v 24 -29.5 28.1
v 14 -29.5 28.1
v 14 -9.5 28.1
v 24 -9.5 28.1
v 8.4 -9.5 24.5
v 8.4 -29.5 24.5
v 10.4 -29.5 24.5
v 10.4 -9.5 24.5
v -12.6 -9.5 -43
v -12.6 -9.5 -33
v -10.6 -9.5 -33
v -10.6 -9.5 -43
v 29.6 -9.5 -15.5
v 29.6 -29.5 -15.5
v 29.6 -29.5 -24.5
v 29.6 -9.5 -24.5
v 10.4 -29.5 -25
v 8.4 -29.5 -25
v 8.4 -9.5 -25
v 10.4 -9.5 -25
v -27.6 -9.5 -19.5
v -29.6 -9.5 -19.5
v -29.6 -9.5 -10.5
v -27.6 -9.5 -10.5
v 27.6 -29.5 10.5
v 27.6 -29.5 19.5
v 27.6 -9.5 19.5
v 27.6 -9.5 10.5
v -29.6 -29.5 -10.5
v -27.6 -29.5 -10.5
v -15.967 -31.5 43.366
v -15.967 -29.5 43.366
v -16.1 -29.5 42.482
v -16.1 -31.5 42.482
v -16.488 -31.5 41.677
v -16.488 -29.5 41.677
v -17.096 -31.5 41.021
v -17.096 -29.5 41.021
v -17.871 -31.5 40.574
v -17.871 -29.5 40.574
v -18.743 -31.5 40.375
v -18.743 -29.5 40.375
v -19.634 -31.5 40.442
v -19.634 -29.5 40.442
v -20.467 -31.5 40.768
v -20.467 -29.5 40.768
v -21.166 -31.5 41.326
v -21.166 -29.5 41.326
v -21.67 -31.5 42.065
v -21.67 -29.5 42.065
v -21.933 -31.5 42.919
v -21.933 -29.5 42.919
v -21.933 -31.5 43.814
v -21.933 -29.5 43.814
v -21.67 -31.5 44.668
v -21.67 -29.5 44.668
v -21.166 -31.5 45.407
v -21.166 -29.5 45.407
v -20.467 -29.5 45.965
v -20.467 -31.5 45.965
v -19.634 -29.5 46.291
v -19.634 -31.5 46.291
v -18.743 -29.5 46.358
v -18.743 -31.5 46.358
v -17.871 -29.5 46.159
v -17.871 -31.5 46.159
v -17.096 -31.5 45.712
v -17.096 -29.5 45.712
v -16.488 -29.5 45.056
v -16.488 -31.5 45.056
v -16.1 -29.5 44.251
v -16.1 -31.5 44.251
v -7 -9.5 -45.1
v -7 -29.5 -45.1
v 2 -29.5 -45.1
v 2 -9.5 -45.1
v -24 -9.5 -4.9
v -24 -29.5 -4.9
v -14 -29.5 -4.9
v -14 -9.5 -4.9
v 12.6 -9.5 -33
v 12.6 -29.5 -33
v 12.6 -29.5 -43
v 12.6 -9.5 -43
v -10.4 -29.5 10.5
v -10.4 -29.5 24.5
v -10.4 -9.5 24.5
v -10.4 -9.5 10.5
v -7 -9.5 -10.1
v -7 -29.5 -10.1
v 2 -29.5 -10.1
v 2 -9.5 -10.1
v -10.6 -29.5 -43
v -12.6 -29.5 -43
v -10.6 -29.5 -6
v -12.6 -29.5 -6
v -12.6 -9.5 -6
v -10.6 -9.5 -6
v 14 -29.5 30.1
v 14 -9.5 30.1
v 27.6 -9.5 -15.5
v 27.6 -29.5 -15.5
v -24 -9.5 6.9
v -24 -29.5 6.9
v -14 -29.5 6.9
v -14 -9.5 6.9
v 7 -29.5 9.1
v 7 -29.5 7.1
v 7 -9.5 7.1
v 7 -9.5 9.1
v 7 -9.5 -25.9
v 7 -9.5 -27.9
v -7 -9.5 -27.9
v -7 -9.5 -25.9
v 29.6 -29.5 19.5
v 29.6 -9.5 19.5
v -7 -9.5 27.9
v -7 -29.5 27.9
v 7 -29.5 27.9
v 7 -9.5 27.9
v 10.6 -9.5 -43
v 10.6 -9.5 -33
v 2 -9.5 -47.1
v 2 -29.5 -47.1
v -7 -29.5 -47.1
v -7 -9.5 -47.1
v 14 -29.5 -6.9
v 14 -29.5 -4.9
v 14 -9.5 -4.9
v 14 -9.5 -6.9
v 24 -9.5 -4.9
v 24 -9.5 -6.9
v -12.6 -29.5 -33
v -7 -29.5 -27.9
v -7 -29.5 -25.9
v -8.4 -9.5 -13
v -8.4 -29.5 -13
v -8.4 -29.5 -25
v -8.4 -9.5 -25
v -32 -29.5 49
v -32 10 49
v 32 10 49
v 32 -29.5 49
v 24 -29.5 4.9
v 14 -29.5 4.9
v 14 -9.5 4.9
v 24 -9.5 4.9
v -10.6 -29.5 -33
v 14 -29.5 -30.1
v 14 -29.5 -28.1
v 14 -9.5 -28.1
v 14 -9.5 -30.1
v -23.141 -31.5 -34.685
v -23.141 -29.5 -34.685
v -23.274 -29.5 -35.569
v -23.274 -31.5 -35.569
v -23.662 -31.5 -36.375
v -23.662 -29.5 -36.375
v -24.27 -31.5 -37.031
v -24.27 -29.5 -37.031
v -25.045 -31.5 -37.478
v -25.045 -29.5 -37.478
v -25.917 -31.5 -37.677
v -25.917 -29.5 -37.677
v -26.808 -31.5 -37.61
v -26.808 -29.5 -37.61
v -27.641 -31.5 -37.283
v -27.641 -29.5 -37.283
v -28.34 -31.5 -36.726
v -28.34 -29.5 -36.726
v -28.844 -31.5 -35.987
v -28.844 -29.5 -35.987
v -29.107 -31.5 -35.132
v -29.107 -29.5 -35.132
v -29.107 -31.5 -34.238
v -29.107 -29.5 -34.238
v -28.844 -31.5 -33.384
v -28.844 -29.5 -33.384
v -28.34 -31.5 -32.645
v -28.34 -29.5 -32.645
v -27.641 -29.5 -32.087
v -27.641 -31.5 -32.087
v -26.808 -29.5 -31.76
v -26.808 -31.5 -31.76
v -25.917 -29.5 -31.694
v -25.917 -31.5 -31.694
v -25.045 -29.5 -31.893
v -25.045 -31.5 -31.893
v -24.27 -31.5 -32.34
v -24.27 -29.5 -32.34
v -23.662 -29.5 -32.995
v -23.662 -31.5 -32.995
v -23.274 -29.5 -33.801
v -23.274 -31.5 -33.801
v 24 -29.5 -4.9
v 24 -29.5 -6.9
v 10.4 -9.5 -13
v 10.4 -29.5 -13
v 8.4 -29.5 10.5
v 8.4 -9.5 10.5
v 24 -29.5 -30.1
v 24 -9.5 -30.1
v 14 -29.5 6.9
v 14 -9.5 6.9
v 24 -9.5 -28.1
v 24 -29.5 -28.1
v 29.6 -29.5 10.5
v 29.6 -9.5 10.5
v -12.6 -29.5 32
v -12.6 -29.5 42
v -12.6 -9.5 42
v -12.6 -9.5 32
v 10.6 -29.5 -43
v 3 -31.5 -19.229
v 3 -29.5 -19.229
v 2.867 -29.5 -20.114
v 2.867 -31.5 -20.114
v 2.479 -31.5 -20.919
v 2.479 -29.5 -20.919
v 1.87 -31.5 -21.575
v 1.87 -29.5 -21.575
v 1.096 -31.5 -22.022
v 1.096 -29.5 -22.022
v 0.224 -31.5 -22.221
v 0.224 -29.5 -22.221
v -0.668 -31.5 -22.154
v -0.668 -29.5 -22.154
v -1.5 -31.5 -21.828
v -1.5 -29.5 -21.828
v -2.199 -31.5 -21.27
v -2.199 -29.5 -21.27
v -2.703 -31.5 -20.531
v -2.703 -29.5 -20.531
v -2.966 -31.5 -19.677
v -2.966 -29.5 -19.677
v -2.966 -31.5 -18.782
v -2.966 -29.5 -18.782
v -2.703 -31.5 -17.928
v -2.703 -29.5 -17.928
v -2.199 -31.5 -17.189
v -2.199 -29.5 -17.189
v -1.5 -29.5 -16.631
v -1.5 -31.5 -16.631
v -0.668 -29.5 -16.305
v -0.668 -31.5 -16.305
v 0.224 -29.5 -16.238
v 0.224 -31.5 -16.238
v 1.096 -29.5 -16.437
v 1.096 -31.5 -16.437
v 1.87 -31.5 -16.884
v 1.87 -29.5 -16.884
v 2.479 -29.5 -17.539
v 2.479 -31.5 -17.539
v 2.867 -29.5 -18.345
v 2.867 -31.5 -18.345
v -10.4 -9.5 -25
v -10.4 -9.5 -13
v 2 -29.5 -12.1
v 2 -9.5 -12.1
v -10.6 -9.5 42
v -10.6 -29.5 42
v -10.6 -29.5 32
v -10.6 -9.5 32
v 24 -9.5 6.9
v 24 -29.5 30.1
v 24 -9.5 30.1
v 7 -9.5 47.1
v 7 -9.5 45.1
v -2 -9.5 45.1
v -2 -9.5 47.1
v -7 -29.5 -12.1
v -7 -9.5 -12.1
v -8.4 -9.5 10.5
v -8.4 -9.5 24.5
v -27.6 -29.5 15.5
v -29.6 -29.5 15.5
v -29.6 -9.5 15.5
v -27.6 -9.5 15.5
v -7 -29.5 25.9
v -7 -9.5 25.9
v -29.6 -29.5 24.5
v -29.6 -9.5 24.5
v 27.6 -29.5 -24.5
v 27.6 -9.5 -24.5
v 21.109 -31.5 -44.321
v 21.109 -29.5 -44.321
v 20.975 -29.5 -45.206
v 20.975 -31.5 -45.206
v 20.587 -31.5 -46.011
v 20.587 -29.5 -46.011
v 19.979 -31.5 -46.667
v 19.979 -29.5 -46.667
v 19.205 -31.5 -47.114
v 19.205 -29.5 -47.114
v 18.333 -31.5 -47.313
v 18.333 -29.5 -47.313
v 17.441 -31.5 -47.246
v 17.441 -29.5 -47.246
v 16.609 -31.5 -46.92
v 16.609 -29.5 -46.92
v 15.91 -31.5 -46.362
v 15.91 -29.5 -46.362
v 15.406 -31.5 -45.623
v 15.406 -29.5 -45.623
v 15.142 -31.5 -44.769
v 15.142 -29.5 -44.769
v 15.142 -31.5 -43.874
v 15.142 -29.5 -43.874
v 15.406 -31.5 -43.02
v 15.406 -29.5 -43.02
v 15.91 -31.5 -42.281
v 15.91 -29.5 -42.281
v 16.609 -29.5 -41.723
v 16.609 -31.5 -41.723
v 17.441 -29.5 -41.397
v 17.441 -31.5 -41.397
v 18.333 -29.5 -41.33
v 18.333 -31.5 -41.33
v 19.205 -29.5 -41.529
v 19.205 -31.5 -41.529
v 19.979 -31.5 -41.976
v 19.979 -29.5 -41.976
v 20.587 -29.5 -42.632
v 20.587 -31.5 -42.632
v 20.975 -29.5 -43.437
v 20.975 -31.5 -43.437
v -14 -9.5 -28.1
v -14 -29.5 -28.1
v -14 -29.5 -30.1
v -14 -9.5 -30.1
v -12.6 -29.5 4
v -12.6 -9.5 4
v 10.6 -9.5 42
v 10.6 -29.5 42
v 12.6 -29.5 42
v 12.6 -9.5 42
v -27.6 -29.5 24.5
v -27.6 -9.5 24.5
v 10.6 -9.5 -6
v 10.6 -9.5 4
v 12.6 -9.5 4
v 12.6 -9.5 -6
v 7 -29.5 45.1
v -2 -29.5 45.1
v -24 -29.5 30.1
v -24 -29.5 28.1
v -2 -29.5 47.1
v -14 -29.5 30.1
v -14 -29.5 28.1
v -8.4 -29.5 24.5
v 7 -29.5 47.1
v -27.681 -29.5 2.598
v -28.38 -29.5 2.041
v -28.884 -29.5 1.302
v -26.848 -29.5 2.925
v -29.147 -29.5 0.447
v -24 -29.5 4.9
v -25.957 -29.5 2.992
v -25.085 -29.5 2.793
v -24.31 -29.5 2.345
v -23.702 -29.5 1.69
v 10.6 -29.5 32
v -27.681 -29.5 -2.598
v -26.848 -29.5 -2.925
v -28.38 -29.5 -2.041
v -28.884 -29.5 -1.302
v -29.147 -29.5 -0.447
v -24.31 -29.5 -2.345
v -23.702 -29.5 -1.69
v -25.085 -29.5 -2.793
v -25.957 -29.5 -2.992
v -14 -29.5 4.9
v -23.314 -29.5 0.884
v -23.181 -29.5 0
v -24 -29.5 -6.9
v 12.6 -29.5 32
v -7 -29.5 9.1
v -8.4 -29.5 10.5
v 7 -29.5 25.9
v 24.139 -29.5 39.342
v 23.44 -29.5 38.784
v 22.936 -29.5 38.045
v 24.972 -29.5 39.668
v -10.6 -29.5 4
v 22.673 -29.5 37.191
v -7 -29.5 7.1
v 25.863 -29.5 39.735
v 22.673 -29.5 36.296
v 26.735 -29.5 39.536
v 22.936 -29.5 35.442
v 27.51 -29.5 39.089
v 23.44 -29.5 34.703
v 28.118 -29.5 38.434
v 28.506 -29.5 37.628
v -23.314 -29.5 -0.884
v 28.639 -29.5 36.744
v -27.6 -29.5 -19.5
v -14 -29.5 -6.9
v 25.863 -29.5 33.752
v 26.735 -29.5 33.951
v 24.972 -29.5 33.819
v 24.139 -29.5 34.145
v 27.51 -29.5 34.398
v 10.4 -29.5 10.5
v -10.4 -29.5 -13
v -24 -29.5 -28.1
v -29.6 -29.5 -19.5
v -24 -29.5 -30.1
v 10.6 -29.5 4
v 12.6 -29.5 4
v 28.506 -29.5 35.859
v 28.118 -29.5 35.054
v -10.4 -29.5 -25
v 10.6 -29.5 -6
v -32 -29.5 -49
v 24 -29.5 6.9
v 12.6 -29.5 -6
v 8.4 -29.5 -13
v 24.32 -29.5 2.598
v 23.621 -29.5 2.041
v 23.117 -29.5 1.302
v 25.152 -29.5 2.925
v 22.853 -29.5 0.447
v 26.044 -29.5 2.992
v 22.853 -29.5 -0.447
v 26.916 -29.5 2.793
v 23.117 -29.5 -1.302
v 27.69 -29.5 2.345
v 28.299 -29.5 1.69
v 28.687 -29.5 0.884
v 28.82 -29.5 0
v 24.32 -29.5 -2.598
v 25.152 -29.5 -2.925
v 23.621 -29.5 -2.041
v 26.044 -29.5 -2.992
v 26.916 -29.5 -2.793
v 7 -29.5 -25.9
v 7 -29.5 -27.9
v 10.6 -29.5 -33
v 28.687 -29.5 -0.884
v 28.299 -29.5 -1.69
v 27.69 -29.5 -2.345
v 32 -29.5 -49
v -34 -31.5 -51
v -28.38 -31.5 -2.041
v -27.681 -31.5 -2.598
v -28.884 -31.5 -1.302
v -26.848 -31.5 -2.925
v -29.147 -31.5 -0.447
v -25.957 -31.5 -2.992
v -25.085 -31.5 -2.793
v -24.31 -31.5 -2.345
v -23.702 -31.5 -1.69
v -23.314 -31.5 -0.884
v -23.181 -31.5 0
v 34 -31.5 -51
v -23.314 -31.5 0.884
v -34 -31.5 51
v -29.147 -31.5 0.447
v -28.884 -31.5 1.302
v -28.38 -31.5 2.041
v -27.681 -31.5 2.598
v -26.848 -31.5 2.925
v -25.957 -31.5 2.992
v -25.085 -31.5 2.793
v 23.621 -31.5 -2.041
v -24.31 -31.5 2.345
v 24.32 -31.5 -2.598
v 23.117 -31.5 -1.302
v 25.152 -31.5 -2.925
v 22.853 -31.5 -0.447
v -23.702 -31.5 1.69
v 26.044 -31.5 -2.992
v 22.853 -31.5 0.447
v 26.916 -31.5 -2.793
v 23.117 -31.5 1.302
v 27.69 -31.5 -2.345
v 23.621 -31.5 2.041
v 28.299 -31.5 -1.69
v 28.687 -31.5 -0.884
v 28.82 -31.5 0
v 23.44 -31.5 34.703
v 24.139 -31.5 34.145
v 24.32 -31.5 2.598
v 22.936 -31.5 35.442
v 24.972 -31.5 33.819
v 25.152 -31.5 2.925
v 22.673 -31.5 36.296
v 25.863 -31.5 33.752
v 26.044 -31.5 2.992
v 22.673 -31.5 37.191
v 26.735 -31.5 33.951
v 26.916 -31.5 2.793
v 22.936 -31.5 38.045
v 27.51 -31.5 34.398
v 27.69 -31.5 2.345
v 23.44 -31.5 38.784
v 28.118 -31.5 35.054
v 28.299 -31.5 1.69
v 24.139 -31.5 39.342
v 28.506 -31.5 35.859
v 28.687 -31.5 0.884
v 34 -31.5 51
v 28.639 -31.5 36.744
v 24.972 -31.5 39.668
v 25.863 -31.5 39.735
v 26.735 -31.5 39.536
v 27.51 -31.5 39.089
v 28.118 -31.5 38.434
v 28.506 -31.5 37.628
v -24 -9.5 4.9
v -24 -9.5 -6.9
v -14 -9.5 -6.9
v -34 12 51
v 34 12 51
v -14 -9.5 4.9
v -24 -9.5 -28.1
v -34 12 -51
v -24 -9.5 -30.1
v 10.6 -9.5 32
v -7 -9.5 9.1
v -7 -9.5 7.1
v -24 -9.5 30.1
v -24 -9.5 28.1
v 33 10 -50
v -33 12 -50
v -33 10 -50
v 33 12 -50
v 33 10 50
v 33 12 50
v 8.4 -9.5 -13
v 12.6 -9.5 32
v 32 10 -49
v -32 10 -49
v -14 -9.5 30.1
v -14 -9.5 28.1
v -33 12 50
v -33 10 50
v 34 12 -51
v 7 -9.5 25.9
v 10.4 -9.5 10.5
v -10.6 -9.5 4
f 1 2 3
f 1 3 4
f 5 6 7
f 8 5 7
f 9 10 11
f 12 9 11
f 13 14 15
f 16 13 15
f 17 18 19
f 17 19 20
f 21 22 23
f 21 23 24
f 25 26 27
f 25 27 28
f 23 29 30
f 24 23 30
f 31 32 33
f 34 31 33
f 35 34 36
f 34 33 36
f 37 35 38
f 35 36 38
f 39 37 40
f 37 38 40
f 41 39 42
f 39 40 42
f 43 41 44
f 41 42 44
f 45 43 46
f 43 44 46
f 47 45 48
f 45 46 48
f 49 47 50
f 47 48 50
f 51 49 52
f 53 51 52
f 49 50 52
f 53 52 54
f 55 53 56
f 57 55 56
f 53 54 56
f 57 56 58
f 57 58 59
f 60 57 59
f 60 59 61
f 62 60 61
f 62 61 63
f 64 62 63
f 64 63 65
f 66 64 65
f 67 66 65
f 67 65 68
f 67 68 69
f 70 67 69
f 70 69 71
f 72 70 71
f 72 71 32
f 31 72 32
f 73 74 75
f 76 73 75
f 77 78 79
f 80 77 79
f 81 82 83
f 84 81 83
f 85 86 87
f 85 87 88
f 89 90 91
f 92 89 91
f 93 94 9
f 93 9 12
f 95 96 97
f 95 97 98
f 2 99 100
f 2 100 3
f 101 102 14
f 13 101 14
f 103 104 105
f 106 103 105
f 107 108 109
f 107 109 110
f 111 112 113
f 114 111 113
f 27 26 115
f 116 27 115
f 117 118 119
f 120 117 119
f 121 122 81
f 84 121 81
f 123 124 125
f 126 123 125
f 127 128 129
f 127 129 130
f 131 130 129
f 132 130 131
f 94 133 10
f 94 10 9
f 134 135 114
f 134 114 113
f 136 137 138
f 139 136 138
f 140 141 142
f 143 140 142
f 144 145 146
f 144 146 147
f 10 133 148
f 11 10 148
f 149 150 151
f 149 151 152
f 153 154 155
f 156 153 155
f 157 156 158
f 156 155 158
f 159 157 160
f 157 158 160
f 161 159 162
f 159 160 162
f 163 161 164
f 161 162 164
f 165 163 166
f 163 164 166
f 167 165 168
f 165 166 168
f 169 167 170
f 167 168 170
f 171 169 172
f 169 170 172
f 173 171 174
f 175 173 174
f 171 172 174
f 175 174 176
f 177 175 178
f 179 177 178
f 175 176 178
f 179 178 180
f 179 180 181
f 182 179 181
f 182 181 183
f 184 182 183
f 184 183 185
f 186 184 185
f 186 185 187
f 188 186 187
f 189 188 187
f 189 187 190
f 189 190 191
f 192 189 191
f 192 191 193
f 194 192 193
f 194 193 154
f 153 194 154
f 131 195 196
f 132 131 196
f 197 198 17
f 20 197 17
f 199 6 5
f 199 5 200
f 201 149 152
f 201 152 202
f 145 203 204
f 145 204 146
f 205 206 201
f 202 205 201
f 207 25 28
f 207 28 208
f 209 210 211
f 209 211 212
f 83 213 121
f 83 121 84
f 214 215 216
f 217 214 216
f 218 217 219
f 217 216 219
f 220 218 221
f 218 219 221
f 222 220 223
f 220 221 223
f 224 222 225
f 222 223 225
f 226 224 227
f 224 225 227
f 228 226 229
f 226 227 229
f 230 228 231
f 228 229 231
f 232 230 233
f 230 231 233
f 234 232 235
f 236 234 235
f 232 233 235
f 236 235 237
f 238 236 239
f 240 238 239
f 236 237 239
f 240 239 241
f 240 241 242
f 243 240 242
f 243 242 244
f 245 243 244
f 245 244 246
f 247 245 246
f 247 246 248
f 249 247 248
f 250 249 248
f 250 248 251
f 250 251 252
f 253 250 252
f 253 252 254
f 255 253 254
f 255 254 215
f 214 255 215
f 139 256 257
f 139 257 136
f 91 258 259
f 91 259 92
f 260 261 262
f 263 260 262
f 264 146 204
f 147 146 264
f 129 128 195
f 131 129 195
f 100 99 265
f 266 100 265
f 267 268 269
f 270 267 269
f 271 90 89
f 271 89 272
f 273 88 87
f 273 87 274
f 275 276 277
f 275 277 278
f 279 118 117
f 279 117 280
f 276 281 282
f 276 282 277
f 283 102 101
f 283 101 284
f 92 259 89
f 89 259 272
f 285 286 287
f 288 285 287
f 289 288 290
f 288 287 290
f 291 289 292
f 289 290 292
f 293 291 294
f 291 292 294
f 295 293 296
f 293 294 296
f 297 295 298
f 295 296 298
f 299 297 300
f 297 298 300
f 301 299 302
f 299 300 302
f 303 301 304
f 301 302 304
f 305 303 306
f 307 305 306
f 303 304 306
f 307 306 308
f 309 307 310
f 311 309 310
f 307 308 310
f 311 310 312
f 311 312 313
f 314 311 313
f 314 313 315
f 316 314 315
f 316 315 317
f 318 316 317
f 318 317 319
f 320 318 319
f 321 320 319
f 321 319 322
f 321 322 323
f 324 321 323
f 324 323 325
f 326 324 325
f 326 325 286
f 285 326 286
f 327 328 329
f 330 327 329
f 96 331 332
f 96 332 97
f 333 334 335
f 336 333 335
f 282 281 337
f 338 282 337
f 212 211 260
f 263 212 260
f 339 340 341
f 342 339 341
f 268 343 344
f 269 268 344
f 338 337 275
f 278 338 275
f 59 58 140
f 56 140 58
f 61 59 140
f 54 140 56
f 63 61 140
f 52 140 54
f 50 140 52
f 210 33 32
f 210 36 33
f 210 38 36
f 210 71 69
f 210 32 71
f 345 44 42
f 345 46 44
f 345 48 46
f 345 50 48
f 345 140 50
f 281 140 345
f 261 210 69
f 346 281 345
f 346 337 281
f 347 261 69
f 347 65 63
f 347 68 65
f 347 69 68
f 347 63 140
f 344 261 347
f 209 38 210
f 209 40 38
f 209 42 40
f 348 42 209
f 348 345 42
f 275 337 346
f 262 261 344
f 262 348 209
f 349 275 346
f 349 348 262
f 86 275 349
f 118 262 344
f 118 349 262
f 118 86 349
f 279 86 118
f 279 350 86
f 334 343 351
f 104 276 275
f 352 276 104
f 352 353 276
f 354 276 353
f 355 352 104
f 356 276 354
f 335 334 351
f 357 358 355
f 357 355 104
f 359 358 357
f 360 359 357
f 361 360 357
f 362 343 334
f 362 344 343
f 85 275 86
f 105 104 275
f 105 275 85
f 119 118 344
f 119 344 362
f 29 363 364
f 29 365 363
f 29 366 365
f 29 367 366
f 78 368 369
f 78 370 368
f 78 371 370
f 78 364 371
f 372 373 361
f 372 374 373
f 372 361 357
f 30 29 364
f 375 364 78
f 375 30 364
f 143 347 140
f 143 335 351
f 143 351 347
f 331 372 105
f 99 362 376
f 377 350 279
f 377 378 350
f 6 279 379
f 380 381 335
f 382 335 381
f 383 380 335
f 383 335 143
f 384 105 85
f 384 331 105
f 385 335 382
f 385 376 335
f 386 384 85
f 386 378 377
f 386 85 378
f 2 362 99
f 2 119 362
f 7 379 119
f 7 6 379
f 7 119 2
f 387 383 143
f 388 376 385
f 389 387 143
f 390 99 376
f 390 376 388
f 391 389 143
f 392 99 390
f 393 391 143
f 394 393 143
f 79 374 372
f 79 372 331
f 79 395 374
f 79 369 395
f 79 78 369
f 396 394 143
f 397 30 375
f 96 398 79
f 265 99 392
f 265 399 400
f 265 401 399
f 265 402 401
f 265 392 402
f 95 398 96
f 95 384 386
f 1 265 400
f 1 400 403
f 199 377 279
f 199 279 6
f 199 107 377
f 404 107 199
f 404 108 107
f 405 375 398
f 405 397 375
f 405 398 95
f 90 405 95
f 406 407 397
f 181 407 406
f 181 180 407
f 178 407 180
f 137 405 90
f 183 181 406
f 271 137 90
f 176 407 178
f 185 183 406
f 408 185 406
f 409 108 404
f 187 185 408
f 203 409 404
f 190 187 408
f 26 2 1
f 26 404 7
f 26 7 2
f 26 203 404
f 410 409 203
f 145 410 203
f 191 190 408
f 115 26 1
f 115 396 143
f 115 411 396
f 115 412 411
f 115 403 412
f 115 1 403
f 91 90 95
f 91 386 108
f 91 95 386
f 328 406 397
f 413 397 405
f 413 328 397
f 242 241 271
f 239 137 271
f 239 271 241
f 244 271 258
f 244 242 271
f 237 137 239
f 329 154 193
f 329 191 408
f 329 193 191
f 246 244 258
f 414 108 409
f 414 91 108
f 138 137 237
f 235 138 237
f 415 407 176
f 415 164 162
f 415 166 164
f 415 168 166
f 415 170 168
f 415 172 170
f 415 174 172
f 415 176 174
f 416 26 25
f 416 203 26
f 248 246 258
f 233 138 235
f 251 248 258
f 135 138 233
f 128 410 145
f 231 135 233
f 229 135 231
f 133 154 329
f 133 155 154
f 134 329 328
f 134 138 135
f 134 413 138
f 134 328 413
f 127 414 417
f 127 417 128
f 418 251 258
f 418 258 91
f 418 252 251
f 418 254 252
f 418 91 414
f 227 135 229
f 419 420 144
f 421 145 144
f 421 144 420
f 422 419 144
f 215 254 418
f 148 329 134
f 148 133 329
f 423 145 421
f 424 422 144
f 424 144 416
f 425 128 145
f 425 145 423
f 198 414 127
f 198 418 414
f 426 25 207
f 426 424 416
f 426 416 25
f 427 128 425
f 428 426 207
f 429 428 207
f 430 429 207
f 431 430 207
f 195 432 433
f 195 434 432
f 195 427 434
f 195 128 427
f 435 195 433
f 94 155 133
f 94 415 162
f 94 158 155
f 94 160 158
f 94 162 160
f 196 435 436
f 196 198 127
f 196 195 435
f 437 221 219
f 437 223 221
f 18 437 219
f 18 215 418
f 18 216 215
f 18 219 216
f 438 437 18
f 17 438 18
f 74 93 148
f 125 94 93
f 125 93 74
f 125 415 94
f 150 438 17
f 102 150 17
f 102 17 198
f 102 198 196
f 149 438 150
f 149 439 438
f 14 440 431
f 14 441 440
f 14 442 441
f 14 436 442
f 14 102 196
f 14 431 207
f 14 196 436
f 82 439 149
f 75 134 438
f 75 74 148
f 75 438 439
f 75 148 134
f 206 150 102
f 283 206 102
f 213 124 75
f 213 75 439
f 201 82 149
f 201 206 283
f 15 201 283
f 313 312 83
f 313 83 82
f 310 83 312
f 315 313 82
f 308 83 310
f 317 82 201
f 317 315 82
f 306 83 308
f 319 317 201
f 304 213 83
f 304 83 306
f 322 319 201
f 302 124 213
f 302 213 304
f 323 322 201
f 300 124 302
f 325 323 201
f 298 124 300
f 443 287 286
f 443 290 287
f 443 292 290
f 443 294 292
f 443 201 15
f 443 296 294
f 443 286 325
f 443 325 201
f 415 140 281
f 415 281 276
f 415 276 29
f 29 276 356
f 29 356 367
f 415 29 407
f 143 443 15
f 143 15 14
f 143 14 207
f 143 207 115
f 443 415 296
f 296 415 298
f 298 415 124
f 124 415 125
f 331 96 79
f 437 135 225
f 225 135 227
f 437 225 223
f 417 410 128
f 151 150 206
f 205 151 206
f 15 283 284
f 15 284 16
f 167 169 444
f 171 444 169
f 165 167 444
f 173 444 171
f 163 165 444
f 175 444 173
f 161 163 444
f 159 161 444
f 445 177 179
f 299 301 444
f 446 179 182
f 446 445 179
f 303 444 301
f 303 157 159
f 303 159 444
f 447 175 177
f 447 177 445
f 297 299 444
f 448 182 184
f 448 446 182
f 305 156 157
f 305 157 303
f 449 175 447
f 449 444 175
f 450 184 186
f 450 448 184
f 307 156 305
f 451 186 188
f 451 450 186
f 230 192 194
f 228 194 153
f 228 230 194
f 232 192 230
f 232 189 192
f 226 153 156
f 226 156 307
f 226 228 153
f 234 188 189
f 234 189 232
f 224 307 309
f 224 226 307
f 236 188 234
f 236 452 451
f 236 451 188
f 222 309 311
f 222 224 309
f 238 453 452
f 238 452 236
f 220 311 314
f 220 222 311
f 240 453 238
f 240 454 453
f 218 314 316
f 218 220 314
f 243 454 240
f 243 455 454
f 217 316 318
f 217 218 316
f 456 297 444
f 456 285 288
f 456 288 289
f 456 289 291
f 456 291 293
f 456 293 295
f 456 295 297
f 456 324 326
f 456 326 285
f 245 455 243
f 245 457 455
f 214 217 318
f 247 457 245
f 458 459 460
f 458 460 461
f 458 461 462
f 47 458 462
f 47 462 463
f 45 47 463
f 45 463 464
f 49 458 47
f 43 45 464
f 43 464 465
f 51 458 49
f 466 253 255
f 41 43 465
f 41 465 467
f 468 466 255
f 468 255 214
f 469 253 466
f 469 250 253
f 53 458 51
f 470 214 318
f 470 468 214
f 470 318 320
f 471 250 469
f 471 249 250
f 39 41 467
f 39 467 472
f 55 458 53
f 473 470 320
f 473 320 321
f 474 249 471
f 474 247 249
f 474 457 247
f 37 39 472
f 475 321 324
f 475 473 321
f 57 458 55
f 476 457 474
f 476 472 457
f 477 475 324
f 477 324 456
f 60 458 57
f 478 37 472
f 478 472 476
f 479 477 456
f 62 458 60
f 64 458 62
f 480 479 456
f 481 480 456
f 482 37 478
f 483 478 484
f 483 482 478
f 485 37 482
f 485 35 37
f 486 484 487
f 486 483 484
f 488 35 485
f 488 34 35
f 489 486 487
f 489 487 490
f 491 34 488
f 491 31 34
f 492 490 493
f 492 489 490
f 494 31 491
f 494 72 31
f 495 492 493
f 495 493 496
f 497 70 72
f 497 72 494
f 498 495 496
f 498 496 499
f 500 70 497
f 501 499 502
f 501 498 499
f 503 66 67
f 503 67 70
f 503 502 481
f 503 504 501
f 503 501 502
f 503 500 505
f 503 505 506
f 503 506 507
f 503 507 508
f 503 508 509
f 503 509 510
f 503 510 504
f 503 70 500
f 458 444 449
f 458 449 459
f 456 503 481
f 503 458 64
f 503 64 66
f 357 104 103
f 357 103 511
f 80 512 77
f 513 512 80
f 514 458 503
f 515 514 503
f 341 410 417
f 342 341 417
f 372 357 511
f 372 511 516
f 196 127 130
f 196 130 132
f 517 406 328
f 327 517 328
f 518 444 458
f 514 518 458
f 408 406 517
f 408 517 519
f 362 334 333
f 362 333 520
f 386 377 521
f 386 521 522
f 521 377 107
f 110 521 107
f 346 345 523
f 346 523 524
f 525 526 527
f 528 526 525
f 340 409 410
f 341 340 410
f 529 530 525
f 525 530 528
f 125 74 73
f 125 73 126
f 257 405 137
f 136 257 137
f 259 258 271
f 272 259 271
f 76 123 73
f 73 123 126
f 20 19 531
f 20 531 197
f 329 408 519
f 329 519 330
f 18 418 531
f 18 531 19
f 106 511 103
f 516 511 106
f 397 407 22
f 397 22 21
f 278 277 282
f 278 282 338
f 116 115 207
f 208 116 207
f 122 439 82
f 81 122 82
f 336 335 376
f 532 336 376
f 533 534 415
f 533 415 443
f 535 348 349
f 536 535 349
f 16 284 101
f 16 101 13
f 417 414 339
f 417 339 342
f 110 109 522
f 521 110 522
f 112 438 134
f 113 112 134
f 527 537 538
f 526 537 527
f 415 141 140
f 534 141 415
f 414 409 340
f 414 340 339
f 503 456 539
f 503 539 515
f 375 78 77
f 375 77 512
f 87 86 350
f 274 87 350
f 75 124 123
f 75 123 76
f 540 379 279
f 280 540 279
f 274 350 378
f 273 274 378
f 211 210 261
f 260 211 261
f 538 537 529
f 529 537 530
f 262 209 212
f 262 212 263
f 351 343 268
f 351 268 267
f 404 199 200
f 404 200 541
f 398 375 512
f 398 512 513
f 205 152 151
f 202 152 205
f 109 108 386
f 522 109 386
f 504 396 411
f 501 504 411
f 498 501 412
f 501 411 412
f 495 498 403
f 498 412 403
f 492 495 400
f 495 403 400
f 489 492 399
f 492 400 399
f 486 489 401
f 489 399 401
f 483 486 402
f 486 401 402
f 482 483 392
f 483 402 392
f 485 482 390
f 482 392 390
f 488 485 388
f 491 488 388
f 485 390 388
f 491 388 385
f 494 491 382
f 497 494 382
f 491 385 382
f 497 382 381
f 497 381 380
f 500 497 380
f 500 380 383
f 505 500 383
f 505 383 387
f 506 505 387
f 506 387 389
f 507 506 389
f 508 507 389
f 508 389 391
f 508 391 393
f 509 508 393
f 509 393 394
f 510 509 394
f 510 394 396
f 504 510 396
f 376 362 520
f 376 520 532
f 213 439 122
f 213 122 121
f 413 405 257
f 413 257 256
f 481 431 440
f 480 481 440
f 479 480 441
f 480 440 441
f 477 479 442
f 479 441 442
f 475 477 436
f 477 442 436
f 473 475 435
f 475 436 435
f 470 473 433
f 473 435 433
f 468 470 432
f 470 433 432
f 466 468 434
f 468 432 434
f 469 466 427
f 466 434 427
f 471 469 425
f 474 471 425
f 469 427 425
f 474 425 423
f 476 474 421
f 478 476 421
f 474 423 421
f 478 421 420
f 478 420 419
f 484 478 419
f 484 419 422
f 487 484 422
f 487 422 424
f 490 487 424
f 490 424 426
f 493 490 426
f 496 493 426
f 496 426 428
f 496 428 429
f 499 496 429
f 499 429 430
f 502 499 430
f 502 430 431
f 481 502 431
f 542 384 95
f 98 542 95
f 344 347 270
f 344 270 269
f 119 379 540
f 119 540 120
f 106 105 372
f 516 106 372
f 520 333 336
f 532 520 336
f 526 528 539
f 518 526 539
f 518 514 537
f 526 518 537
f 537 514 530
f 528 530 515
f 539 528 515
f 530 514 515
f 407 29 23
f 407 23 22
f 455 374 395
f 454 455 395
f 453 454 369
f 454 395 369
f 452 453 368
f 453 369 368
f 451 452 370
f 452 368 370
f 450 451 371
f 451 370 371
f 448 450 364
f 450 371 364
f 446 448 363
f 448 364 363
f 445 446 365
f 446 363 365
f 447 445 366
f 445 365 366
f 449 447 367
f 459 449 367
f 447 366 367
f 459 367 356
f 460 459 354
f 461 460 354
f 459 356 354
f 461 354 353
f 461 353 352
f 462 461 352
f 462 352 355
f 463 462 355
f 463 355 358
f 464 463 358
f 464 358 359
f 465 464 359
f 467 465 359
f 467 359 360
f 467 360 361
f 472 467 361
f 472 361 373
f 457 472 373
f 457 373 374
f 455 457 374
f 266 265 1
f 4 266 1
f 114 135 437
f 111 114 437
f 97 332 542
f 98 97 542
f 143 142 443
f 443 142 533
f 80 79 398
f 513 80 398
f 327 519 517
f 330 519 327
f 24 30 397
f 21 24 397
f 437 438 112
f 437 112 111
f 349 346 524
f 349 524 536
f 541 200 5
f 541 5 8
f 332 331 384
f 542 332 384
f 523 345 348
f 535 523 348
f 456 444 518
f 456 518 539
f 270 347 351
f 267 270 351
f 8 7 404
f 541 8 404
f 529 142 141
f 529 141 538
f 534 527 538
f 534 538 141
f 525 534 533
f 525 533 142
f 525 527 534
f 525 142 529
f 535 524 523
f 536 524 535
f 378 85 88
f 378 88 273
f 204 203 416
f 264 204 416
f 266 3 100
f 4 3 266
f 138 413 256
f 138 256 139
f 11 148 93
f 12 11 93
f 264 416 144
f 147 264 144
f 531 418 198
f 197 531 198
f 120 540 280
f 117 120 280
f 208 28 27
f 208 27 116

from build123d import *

# Parameters (mm, degrees)
SKETCH287_W     = 68
SKETCH287_H     = 102
PAD198_DEPTH    = 43.5
SKETCH288_W     = 64
SKETCH288_H     = 98
POCKET042_DEPTH = 41.5
SKETCH289_W     = 66
SKETCH289_H     = 100
POCKET043_DEPTH = 2
SKETCH290_W     = 2
SKETCH290_H     = 9
SKETCH290_H_2   = 12
SKETCH290_H_3   = 14
SKETCH290_H_4   = 10
SKETCH290_W_2   = 10
SKETCH290_H_5   = 2
PAD199_DEPTH    = 20
SKETCH291_R     = 3
POCKET044_DEPTH = 5


with BuildPart() as part:
    # Sketch287 → Pad198 (new body)
    with BuildSketch(Plane.XZ):
        Rectangle(SKETCH287_W, SKETCH287_H)
    extrude(amount=-PAD198_DEPTH)

    # Sketch288 (on Face6 of Pad198) → Pocket042 (cut)
    with BuildSketch(Plane(origin=(0, 43.5, 0), x_dir=(1, 0, 0), z_dir=(0, 1, 0))):
        Rectangle(SKETCH288_W, SKETCH288_H)
    extrude(amount=-POCKET042_DEPTH, mode=Mode.SUBTRACT)

    # Sketch289 (on Face5 of Pocket042) → Pocket043 (cut)
    with BuildSketch(Plane(origin=(0, 43.5, 0), x_dir=(1, 0, 0), z_dir=(0, 1, 0))):
        Rectangle(SKETCH289_W, SKETCH289_H)
    extrude(amount=-POCKET043_DEPTH, mode=Mode.SUBTRACT)

    # Sketch290 (on Face16 of Pocket043) → Pad199 (join)
    with BuildSketch(Plane(origin=(0, 2, 0), x_dir=(1, 0, 0), z_dir=(0, 1, 0))):
        with Locations((28.6, 20)):
            Rectangle(SKETCH290_W, SKETCH290_H)
        with Locations((28.6, -15)):
            Rectangle(SKETCH290_W, SKETCH290_H)
        with Locations((9.4, 19)):
            Rectangle(SKETCH290_W, SKETCH290_H_2)
        with Locations((9.4, -17.5)):
            Rectangle(SKETCH290_W, SKETCH290_H_3)
        with Locations((11.6, 1)):
            Rectangle(SKETCH290_W, SKETCH290_H_4)
        with Locations((11.6, 38)):
            Rectangle(SKETCH290_W, SKETCH290_H_4)
        Polygon((0, 47.1), (2, 47.1), (2, 45.1), (0, 45.1), (-7, 45.1), (-7, 47.1), align=None)
        Polygon((0, 27.9), (7, 27.9), (7, 25.9), (0, 25.9), (-7, 25.9), (-7, 27.9), align=None)
        Polygon((0, 12.1), (2, 12.1), (2, 10.1), (0, 10.1), (-7, 10.1), (-7, 12.1), align=None)
        Polygon((0, -7.1), (7, -7.1), (7, -9.1), (0, -9.1), (-7, -9.1), (-7, -7.1), align=None)
        Polygon((0, -25.9), (7, -25.9), (7, -27.9), (0, -27.9), (-7, -27.9), (-7, -25.9), align=None)
        with Locations((11.6, -37)):
            Rectangle(SKETCH290_W, SKETCH290_H_4)
        Polygon((0, -45.1), (7, -45.1), (7, -47.1), (0, -47.1), (-2, -47.1), (-2, -45.1), align=None)
        with Locations((19, 5.9)):
            Rectangle(SKETCH290_W_2, SKETCH290_H_5)
        with Locations((19, -5.9)):
            Rectangle(SKETCH290_W_2, SKETCH290_H_5)
        with Locations((19, -29.1)):
            Rectangle(SKETCH290_W_2, SKETCH290_H_5)
        with Locations((19, 29.1)):
            Rectangle(SKETCH290_W_2, SKETCH290_H_5)
        with Locations((-28.6, 15)):
            Rectangle(SKETCH290_W, SKETCH290_H)
        with Locations((-28.6, -20)):
            Rectangle(SKETCH290_W, SKETCH290_H)
        with Locations((-9.4, 19)):
            Rectangle(SKETCH290_W, SKETCH290_H_2)
        with Locations((-9.4, -17.5)):
            Rectangle(SKETCH290_W, SKETCH290_H_3)
        with Locations((-11.6, 1)):
            Rectangle(SKETCH290_W, SKETCH290_H_4)
        with Locations((-11.6, 38)):
            Rectangle(SKETCH290_W, SKETCH290_H_4)
        with Locations((-11.6, -37)):
            Rectangle(SKETCH290_W, SKETCH290_H_4)
        with Locations((-19, 5.9)):
            Rectangle(SKETCH290_W_2, SKETCH290_H_5)
        with Locations((-19, -5.9)):
            Rectangle(SKETCH290_W_2, SKETCH290_H_5)
        with Locations((-19, -29.1)):
            Rectangle(SKETCH290_W_2, SKETCH290_H_5)
        with Locations((-19, 29.1)):
            Rectangle(SKETCH290_W_2, SKETCH290_H_5)
    extrude(amount=PAD199_DEPTH)

    # Sketch291 (on Face16 of Pad199) → Pocket044 (cut)
    with BuildSketch(Plane(origin=(0, 2, 0), x_dir=(1, 0, 0), z_dir=(0, 1, 0))):
        with Locations((-26.14077, 34.68518)):
            Circle(SKETCH291_R)
        with Locations((18.10867, 44.321499)):
            Circle(SKETCH291_R)
        with Locations((25.819803, 0)):
            Circle(SKETCH291_R)
        with Locations((25.639233, -36.743561)):
            Circle(SKETCH291_R)
        with Locations((-18.966691, -43.366471)):
            Circle(SKETCH291_R)
        with Locations((-26.180906, 0)):
            Circle(SKETCH291_R)
        with Locations((0, 19.229425)):
            Circle(SKETCH291_R)
    extrude(amount=-POCKET044_DEPTH, mode=Mode.SUBTRACT)


with BuildPart() as part_1:
    # Body062 placement: moved
    add(part.part.moved(Location((0, -31.5, 0))))


solid = part_1.part
